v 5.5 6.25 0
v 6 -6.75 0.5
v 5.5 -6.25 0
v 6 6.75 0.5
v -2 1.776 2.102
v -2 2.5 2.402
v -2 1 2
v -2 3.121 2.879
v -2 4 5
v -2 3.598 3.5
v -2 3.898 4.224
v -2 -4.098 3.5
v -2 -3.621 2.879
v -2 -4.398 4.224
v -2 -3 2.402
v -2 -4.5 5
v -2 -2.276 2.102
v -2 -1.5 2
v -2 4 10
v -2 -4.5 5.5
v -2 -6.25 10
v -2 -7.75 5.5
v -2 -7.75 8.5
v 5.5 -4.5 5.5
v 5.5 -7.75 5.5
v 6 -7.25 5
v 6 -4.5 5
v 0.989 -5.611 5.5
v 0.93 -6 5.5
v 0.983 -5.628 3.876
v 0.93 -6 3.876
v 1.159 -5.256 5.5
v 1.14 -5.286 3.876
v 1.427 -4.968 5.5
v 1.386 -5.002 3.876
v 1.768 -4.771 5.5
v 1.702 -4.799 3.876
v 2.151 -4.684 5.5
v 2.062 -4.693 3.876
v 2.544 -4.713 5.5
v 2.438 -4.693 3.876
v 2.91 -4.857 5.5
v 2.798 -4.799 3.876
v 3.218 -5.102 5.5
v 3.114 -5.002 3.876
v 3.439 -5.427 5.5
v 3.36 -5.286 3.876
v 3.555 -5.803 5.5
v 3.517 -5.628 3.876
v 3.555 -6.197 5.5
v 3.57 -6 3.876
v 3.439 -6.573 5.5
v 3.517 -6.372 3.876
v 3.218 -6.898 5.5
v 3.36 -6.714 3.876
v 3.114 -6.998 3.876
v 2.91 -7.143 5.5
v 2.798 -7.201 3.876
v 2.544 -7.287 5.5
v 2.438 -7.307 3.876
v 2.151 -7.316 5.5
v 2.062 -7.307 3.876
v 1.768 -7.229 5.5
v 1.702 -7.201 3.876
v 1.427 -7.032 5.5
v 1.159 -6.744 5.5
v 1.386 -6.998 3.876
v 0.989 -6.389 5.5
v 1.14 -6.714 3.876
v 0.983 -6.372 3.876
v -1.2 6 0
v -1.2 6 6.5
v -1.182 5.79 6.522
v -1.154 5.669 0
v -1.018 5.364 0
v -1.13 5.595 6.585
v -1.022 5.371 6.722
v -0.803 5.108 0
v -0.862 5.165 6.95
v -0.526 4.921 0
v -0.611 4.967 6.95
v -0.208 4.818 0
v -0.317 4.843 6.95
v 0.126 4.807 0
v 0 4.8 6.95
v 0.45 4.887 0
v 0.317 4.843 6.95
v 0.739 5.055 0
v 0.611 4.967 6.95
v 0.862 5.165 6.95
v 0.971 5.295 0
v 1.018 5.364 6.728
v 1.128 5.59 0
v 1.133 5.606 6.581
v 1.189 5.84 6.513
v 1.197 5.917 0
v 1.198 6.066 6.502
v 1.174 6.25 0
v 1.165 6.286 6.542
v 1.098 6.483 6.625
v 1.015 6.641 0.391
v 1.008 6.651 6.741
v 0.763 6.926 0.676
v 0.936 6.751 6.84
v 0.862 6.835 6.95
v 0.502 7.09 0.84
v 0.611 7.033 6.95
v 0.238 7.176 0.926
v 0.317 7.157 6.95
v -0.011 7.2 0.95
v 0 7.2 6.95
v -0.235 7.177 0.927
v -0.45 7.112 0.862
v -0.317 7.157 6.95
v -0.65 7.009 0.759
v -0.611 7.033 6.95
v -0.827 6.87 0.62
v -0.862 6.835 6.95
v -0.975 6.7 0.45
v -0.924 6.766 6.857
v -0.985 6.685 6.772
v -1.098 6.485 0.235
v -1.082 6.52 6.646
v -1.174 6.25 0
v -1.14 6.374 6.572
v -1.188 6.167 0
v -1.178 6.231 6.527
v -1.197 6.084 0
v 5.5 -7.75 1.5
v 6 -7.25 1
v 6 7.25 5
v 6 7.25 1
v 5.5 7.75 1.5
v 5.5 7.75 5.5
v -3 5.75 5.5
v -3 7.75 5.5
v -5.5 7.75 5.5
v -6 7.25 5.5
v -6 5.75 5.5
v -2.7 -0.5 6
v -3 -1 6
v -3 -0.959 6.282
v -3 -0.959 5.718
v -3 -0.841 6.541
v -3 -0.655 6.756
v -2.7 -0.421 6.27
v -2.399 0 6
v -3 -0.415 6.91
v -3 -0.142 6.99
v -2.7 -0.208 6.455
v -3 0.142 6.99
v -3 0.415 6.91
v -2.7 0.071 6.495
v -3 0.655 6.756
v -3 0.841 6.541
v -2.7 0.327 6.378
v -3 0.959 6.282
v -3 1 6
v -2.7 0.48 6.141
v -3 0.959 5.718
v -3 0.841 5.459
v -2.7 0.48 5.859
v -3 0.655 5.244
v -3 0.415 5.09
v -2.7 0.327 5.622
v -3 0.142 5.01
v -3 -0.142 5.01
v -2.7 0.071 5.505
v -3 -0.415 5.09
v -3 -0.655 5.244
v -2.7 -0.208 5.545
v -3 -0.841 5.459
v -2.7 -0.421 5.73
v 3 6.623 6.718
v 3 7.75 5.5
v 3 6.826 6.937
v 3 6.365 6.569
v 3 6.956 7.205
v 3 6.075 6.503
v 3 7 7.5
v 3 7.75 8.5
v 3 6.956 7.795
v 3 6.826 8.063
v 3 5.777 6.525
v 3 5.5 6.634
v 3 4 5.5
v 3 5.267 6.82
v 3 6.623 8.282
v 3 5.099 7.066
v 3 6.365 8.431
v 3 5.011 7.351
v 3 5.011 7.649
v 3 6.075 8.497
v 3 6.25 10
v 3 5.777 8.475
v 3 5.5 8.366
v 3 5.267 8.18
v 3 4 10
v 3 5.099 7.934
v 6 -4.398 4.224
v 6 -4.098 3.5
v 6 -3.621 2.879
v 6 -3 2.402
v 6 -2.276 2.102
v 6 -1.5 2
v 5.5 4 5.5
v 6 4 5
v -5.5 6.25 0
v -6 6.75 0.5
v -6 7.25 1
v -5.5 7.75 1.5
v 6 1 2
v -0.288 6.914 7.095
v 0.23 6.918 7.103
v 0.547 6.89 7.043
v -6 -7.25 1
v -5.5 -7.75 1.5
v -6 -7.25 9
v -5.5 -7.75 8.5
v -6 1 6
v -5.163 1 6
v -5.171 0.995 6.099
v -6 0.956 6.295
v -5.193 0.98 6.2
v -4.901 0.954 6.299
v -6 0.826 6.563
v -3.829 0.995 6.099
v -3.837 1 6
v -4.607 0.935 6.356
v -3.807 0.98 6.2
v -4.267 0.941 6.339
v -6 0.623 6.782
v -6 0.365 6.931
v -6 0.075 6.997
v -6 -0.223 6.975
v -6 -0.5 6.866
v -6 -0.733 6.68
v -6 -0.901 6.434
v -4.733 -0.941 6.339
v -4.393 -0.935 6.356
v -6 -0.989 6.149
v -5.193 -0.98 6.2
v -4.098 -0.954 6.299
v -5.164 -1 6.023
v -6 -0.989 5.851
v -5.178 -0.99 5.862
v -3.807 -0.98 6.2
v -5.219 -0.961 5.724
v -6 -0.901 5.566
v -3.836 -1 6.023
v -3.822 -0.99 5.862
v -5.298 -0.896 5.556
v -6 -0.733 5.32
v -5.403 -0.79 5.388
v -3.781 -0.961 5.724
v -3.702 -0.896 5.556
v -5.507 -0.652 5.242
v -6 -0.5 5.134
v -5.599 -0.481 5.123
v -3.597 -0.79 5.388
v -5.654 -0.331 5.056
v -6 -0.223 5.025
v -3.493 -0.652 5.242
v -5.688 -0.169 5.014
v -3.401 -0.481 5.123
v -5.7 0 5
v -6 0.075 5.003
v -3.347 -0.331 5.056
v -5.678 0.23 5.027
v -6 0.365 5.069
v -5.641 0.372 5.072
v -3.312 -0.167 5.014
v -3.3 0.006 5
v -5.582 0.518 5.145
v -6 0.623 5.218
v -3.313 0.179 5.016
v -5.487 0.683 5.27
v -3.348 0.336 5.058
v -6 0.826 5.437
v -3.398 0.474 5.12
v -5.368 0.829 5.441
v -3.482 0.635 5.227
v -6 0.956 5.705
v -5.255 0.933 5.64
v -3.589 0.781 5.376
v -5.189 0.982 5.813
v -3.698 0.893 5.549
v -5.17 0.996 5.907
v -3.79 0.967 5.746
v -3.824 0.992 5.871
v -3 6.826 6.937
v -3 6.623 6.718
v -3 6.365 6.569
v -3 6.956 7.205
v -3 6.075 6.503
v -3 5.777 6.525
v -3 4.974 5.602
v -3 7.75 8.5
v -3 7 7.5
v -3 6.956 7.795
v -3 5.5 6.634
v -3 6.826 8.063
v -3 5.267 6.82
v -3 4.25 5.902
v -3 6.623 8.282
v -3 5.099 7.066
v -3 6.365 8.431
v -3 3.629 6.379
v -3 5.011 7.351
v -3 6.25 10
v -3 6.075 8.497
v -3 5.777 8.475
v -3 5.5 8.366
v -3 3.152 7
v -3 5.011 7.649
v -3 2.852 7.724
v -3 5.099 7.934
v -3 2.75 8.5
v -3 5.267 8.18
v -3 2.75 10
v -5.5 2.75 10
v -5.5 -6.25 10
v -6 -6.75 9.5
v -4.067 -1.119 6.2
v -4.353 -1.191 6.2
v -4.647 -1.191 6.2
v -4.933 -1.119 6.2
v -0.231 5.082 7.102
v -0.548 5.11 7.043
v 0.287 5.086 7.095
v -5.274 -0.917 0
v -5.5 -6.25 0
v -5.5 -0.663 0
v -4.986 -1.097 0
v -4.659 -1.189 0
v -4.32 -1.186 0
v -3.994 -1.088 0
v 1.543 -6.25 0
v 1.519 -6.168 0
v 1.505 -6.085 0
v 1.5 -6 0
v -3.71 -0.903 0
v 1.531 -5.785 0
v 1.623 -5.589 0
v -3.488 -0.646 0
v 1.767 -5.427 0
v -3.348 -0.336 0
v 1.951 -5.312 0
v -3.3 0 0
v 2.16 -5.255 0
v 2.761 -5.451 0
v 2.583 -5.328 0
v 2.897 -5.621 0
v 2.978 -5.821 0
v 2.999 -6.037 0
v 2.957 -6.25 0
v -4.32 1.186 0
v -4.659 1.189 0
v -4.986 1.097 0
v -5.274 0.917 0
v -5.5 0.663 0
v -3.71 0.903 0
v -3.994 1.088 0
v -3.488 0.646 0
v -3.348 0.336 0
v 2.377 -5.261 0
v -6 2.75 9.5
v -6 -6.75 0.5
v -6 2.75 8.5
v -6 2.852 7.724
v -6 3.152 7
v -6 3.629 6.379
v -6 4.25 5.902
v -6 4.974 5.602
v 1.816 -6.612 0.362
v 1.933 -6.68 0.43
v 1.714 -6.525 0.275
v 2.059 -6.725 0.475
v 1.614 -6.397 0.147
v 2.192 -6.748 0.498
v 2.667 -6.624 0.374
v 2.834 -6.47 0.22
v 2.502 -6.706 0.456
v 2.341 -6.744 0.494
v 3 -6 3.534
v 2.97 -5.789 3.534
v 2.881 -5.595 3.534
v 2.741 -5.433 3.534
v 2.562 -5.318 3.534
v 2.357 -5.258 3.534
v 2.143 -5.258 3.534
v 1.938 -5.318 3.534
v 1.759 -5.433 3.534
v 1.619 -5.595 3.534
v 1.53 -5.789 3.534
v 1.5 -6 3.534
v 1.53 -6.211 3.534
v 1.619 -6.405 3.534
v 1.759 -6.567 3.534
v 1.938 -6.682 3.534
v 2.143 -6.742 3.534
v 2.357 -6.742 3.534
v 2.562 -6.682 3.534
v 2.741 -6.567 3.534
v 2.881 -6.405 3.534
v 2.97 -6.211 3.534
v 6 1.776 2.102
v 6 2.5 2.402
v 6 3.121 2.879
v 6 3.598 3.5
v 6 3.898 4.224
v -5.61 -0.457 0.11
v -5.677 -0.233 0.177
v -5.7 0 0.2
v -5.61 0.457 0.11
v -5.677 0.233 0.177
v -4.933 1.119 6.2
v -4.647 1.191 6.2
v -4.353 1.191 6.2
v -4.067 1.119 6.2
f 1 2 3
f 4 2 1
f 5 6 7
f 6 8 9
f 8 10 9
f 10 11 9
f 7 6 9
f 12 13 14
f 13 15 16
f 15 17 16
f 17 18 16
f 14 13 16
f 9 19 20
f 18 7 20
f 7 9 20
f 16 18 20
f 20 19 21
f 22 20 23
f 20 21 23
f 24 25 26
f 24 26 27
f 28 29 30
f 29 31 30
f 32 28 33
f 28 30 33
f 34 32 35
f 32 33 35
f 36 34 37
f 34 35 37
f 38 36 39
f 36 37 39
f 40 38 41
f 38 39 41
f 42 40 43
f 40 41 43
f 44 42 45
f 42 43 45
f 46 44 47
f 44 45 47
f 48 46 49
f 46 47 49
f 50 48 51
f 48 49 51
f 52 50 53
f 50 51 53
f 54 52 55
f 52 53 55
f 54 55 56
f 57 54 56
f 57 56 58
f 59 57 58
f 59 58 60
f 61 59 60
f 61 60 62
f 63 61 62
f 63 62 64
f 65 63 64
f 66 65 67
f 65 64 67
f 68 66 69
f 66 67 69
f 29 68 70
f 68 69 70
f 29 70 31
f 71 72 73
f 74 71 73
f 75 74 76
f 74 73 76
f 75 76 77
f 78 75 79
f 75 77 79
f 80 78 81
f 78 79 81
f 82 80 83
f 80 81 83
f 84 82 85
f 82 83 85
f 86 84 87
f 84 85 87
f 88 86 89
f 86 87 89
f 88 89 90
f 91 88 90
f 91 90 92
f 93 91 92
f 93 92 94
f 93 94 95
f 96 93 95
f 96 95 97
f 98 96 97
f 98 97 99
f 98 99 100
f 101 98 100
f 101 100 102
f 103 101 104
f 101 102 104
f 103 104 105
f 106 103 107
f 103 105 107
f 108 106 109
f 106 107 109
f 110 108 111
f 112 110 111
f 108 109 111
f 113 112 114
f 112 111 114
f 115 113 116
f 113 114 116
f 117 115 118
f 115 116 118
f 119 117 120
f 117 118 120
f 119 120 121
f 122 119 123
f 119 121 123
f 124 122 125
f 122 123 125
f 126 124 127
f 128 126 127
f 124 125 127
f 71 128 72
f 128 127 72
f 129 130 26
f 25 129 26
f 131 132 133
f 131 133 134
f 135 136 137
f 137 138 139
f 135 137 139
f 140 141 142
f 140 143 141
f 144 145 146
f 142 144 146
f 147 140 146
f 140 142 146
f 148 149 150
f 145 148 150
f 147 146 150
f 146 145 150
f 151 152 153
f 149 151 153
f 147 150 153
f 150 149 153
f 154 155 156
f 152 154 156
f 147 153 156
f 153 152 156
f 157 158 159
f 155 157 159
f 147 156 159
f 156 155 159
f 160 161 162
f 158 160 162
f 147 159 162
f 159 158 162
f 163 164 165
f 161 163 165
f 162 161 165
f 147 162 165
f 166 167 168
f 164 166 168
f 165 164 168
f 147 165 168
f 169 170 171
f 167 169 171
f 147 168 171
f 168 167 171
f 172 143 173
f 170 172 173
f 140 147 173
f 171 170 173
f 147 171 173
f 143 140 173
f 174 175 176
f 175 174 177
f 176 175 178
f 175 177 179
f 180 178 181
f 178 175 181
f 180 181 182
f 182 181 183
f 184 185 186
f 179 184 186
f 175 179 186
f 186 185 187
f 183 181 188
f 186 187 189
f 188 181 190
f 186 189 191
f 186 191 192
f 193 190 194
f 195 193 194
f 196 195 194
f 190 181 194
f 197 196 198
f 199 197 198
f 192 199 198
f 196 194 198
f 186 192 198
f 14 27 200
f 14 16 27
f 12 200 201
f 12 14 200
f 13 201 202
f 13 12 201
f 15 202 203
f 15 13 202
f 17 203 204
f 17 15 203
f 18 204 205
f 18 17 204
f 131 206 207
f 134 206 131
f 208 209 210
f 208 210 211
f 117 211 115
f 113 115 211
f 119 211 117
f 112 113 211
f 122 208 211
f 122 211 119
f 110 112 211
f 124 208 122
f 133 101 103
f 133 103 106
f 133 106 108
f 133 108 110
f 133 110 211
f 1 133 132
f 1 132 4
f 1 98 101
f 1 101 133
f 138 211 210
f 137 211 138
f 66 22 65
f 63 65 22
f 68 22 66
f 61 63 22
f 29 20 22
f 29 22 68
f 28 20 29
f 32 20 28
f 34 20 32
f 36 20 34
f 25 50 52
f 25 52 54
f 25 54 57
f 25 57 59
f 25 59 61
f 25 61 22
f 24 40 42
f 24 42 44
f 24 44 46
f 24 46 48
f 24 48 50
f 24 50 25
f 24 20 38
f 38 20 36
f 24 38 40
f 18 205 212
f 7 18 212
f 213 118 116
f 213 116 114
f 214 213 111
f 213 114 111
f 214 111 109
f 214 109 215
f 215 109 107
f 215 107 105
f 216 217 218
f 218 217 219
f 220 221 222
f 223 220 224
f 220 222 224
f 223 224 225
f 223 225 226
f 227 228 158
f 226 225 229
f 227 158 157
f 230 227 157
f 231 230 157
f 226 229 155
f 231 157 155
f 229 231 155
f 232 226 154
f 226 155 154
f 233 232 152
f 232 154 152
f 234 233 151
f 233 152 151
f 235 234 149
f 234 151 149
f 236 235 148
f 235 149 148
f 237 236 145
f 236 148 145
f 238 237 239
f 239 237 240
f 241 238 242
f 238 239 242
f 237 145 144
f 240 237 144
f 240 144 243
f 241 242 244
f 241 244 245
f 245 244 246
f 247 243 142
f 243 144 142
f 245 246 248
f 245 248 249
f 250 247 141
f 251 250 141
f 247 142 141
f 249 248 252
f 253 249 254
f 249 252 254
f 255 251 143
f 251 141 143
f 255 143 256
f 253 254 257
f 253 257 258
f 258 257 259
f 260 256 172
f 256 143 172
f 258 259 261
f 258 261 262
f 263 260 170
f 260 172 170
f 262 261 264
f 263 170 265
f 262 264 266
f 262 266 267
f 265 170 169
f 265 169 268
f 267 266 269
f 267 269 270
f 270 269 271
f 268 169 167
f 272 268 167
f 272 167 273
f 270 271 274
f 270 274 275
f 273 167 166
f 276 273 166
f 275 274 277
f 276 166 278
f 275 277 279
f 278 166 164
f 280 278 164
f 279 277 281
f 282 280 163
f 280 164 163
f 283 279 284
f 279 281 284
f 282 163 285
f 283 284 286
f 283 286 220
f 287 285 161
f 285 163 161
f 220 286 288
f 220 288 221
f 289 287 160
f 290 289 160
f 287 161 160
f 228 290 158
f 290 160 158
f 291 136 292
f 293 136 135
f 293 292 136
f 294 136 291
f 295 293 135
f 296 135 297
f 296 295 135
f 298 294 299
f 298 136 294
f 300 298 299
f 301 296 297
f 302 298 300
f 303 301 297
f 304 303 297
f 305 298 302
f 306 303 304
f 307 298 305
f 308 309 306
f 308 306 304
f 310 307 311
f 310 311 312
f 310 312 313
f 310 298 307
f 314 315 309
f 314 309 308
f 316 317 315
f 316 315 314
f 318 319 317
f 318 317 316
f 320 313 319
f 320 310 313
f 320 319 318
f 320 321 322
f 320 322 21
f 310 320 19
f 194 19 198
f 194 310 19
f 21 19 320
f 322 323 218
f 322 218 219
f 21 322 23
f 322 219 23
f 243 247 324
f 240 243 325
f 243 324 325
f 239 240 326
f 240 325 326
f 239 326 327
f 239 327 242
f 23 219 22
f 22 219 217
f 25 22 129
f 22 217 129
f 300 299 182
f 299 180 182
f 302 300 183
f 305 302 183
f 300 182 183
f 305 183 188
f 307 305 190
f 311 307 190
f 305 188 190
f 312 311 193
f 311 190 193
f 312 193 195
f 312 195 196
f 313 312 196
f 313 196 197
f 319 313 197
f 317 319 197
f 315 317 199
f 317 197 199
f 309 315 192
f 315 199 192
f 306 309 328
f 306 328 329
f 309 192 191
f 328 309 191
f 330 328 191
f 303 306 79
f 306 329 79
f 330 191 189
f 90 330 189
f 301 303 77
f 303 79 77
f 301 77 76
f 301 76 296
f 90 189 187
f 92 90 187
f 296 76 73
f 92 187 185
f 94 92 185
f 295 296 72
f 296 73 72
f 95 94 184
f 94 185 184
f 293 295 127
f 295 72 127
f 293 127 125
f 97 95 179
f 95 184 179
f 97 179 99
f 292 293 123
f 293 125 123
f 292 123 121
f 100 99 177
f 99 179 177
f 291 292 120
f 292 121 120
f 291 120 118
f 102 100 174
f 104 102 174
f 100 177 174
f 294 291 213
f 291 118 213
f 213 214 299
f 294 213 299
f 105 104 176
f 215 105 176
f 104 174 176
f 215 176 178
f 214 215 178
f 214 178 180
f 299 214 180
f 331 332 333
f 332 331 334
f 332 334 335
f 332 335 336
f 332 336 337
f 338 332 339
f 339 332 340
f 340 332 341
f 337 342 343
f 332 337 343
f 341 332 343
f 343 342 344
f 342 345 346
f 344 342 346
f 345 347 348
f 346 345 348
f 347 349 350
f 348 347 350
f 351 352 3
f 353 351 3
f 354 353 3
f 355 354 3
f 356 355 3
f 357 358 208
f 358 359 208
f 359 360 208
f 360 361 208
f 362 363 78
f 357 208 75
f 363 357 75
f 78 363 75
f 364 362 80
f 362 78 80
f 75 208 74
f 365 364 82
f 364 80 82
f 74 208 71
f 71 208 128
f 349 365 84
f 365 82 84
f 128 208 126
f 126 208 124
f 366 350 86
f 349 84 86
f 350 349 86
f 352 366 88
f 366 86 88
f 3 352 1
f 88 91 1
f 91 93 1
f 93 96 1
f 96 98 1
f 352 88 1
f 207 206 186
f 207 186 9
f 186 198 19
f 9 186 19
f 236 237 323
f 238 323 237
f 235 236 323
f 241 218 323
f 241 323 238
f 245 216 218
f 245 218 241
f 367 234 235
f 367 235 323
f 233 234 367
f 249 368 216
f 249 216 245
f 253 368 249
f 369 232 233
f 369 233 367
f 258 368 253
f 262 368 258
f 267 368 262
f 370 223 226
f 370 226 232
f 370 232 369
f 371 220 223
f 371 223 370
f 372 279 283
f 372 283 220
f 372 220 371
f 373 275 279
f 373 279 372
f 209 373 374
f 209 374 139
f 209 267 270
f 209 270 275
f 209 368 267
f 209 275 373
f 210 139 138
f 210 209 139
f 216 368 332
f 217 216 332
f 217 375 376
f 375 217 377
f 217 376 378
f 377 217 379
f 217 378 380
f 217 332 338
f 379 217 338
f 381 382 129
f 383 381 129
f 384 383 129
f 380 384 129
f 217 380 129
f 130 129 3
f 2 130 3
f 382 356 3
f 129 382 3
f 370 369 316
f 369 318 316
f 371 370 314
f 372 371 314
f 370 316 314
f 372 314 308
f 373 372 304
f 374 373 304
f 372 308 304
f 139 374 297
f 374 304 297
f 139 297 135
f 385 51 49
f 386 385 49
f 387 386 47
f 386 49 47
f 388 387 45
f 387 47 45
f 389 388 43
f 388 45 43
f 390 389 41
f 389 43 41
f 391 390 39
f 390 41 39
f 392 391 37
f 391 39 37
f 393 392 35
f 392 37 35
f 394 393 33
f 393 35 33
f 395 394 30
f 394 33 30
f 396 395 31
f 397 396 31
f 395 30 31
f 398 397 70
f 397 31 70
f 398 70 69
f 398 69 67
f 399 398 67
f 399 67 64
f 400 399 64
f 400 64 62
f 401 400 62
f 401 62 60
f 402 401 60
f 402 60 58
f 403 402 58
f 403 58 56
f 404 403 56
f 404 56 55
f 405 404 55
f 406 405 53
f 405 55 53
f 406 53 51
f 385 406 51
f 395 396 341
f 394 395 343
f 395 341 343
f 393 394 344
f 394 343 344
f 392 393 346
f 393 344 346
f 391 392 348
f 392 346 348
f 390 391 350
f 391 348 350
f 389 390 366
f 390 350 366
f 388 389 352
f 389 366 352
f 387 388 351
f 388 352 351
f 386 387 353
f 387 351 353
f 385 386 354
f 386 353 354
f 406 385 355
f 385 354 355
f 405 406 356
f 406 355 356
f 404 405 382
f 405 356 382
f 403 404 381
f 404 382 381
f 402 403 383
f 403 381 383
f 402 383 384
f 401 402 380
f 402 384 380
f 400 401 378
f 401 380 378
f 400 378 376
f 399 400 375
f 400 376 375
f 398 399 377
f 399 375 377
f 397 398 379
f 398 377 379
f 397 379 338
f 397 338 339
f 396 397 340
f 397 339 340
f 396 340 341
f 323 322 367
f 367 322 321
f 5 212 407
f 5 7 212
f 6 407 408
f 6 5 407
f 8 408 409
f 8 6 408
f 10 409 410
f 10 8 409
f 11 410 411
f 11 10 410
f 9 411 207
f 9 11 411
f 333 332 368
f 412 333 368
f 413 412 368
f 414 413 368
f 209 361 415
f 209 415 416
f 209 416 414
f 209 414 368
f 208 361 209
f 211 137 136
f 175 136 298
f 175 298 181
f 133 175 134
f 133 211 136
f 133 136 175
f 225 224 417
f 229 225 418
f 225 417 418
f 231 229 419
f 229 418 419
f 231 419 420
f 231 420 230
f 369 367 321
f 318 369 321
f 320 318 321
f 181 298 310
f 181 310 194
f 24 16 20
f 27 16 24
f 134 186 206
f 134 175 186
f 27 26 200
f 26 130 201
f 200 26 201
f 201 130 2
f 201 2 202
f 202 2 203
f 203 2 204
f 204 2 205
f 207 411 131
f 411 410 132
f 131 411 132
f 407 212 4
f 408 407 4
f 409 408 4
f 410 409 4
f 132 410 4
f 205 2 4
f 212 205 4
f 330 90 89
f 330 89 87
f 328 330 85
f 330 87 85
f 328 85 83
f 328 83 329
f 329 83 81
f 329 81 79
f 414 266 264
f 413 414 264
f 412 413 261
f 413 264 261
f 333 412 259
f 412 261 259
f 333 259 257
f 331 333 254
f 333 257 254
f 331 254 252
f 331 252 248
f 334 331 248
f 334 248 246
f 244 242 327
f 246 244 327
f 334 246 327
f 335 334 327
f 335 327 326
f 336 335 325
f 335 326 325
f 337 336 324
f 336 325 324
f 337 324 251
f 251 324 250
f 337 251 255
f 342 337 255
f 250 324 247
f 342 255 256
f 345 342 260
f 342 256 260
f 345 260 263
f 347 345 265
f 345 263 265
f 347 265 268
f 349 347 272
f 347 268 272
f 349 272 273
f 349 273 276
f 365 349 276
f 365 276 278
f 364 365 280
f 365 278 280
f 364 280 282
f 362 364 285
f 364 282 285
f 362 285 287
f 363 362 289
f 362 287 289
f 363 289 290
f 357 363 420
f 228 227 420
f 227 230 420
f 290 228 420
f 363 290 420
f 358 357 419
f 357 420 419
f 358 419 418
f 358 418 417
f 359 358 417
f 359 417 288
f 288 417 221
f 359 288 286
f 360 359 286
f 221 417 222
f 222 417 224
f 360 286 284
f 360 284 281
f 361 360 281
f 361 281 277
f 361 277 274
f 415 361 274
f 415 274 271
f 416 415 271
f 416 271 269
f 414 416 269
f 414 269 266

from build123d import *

# Parameters (mm, degrees)
F0_W      = 12
F0_H      = 15.5
F1_DEPTH  = 10
F3_DEPTH  = 4.5
F4_W      = 8.5
F4_H      = 3.5
F5_DEPTH  = 8
F6_R      = 3
F7_SIZE   = 1.5
F9_D      = 2
F9_DEPTH  = 3
F9_TIP    = 0.600860619
F12_W     = 5
F12_H     = 4.5
F13_DEPTH = 3
F14_R     = 3
F16_D     = 2
F18_D     = 1.5
F20_D     = 2.64
F20_DEPTH = 1.624
F20_TIP   = 0.7931360171
F21_SIZE  = 0.5
F23_D     = 2.4
F23_DEPTH = 6
F23_START = 0.2
F23_TIP   = 0.7210327428
F25_D     = 2.4
F25_DEPTH = 6
F25_START = 0.95
F25_TIP   = 0.7210327428


# Not quite as in the source:
# - a feature of the source that left no trace in its solid (it failed there, or was rolled back) is left out


with BuildPart() as f1:
    # F0 (on Top) → F1 (new body)
    with BuildSketch(Plane.XY):
        Rectangle(F0_W, F0_H)
    extrude(amount=F1_DEPTH)

    # F2 (on face) → F3 (cut)
    with BuildSketch(Plane.XY.offset(10)):
        Polygon((-2, -7.75), (6, -7.75), (6, 7.75), (3, 7.75), (3, 4), (-2, 4), align=None)
    extrude(amount=-F3_DEPTH, mode=Mode.SUBTRACT)

    # F4 (on face) → F5 (cut)
    with BuildSketch(Plane.YZ.offset(6)):
        with Locations((-0.25, 3.75)):
            Rectangle(F4_W, F4_H)
    extrude(amount=-F5_DEPTH, mode=Mode.SUBTRACT)

    # F6
    f6_edges = [f1.edges().sort_by_distance(p)[0] for p in [
        (2, 4, 2),
        (2, -4.5, 2),
    ]]
    fillet(f6_edges, radius=F6_R)

    # F7
    f7_edges = [f1.edges().sort_by_distance(p)[0] for p in [
        (-1.5, 7.75, 10),
        (0, -7.75, 0),
        (-4, -7.75, 10),
        (0, 7.75, 0),
    ]]
    chamfer(f7_edges, length=F7_SIZE)

    # F9
    with Locations(Plane(origin=(-6, 0, 0), x_dir=(0, -1, 0), z_dir=(-1, 0, 0))):
        with Locations((0, 6)):
            Hole(F9_D / 2, depth=F9_DEPTH)
            with Locations((0, 0, -(F9_DEPTH + F9_TIP / 2))):  # 118° drill point
                Cone(0, F9_D / 2, F9_TIP, mode=Mode.SUBTRACT)

    # F12 (on face) → F13 (cut)
    with BuildSketch(Plane(origin=(-6, 0, 0), x_dir=(0, -1, 0), z_dir=(-1, 0, 0))):
        with Locations((-5.25, 7.75)):
            Rectangle(F12_W, F12_H)
    extrude(amount=-F13_DEPTH, mode=Mode.SUBTRACT)

    # F14
    f14_edges = [f1.edges().sort_by_distance(p)[0] for p in [
        (-4.5, 2.75, 5.5),
    ]]
    fillet(f14_edges, radius=F14_R)

    # F16 (through all)
    with Locations(Plane(origin=(-3, 0, 0), x_dir=(0, -1, 0), z_dir=(-1, 0, 0))):
        with Locations((-6, 7.5)):
            Hole(F16_D / 2)

    # F18 (through all)
    with Locations(Plane.XY.offset(5.5)):
        with Locations((2.25, -6)):
            Hole(F18_D / 2)

    # F20
    with Locations(Plane.XY.offset(5.5)):
        with Locations((2.25, -6)):
            Hole(F20_D / 2, depth=F20_DEPTH)
            with Locations((0, 0, -(F20_DEPTH + F20_TIP / 2))):  # 118° drill point
                Cone(0, F20_D / 2, F20_TIP, mode=Mode.SUBTRACT)

    # F21
    f21_edges = [f1.edges().sort_by_distance(p)[0] for p in [
        (-6, -1.75, 10),
        (6, -6.125, 5.5),
        (6, 5.875, 5.5),
        (6, 7.75, 3.5),
        (6, 0, 0),
        (-6, 0, 0),
        (-6, -7.75, 5),
        (-6, 7.75, 3.5),
        (6, -7.75, 3.5),
    ]]
    chamfer(f21_edges, length=F21_SIZE)

    # F23
    # its depths count from where the whole tool has entered the part; down to there all is cleared
    with Locations(Plane(origin=(0, 0, 0), x_dir=(1, 0, 0), z_dir=(0, 0, -1)).offset(-F23_START)):
        with Locations((-4.5, 0)):
            Hole(F23_D / 2, depth=F23_DEPTH)
            with Locations((0, 0, -(F23_DEPTH + F23_TIP / 2))):  # 118° drill point
                Cone(0, F23_D / 2, F23_TIP, mode=Mode.SUBTRACT)

    # F25
    # its depths count from where the whole tool has entered the part; down to there all is cleared
    with Locations(Plane(origin=(0, 0, 0), x_dir=(1, 0, 0), z_dir=(0, 0, -1)).offset(-F25_START)):
        with Locations((0, -6)):
            Hole(F25_D / 2, depth=F25_DEPTH)
            with Locations((0, 0, -(F25_DEPTH + F25_TIP / 2))):  # 118° drill point
                Cone(0, F25_D / 2, F25_TIP, mode=Mode.SUBTRACT)


solid = f1.part
